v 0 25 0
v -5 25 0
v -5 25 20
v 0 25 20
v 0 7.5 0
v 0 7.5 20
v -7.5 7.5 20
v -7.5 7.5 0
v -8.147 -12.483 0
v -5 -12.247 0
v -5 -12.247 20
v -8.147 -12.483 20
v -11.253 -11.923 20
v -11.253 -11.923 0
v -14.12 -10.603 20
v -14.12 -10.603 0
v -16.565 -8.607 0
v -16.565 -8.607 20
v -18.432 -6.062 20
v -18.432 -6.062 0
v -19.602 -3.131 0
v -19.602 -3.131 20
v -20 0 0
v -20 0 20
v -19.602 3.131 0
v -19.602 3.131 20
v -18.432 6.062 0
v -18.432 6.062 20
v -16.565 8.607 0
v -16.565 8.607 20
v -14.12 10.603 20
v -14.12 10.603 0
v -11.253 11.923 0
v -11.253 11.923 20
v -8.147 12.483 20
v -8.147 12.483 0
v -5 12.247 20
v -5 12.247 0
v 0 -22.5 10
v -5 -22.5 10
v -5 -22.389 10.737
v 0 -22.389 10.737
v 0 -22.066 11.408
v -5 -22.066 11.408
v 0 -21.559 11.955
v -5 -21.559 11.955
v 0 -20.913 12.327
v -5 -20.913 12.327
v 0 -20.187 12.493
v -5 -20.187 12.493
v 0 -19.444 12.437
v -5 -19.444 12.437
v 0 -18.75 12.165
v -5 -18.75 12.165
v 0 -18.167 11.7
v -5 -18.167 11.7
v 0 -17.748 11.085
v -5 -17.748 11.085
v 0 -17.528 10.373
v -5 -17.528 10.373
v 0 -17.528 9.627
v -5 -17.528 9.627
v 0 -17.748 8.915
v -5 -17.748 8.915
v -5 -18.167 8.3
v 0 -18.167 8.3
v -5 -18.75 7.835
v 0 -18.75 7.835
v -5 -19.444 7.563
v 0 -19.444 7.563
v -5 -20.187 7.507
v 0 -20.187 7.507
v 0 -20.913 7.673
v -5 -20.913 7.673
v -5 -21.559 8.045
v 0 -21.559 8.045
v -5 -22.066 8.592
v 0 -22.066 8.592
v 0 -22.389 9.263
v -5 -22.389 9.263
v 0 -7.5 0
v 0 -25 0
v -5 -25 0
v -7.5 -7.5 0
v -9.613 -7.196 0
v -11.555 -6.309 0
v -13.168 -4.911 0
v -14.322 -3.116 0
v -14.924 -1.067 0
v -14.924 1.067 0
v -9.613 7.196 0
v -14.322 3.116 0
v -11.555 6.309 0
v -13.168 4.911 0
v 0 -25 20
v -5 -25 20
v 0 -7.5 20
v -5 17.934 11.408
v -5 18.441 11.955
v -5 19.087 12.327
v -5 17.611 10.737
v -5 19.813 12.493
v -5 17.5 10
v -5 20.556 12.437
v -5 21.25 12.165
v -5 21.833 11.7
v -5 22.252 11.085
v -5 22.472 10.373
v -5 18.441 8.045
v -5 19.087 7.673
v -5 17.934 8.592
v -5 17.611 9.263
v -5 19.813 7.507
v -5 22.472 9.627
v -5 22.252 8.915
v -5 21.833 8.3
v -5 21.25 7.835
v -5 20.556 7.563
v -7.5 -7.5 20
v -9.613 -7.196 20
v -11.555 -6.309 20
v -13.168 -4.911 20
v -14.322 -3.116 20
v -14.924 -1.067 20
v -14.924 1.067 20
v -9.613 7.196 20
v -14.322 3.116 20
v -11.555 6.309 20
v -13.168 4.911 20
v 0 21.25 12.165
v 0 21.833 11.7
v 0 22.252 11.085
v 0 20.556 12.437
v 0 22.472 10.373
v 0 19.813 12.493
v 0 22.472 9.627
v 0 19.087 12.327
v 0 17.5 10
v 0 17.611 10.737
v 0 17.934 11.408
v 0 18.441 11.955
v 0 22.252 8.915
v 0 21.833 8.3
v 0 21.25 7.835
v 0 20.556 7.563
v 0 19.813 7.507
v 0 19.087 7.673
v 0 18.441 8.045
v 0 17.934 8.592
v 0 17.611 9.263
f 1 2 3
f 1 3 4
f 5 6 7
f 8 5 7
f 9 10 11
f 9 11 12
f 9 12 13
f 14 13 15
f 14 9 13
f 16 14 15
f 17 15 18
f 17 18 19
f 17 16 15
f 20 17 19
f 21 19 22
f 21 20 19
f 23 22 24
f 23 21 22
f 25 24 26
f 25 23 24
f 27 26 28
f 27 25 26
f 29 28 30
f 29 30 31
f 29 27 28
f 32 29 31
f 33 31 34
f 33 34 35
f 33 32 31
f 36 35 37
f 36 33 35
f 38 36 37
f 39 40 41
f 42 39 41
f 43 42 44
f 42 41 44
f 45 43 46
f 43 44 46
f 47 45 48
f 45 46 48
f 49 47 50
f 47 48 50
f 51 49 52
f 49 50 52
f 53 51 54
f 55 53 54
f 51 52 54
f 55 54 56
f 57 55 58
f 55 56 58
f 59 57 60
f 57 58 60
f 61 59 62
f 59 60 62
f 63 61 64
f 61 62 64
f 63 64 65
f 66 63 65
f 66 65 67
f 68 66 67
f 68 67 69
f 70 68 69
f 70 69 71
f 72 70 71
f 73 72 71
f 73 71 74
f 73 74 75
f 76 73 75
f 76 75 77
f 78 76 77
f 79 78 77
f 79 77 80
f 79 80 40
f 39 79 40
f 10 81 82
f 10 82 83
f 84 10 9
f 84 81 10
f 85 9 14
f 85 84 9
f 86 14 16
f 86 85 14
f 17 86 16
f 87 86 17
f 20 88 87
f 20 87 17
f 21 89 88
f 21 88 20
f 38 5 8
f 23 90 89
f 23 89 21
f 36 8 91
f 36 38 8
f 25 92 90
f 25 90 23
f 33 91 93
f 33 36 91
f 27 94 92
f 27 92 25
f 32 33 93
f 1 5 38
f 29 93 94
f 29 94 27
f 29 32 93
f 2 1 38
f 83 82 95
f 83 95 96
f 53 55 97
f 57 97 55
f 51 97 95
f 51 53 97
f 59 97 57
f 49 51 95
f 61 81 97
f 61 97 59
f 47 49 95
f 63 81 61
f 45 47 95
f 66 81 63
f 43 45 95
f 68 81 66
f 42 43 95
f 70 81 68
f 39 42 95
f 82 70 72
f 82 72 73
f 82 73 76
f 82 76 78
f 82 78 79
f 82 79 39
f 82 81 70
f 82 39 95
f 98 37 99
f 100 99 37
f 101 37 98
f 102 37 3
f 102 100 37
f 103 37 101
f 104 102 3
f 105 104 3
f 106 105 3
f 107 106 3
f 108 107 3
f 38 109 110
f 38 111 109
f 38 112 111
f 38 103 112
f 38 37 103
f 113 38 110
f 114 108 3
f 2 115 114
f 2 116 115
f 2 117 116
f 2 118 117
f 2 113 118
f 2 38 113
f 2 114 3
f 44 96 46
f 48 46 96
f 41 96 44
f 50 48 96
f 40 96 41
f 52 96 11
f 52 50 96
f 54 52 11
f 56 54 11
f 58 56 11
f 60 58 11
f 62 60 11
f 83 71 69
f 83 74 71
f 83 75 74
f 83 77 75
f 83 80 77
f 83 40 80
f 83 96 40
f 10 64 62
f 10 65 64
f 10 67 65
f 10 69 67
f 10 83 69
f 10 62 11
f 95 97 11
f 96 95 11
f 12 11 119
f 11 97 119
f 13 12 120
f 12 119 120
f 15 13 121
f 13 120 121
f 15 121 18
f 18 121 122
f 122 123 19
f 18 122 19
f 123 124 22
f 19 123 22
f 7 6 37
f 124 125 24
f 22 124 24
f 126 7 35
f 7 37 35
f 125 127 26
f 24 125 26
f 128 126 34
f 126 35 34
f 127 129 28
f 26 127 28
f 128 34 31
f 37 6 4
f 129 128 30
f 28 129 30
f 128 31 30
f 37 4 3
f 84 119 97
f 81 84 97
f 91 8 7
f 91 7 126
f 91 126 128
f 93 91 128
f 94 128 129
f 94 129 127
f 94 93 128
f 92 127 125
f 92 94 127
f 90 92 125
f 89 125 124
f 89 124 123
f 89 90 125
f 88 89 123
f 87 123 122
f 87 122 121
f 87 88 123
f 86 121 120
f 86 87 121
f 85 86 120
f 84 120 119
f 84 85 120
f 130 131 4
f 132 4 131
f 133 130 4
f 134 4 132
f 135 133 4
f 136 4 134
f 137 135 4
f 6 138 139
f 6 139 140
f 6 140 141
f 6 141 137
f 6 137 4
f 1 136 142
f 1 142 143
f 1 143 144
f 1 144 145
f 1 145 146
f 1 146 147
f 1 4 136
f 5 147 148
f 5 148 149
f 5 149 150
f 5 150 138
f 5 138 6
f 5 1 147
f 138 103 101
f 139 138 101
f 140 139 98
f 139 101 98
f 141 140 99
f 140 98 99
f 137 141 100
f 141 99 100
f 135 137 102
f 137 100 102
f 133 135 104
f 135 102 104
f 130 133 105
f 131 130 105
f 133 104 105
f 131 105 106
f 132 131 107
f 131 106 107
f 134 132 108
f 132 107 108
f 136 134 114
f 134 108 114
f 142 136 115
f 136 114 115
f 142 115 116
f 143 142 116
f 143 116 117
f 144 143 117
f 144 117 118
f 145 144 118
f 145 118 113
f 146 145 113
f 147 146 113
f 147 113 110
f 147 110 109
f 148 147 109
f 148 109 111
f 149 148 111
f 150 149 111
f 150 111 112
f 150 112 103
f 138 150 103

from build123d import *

# Parameters (mm, degrees)
BOSS_EXTRUDE1_DEPTH = 20
SKETCH2_R           = 2.5
CUT_EXTRUDE1_DEPTH  = 15


with BuildPart() as part:
    # Sketch1 → Boss-Extrude1 (new body)
    with BuildSketch(Plane.XY):
        with BuildLine():
            Line((-5, 12.247448714), (-5, 25))
            Line((-5, 25), (0, 25))
            Line((0, 25), (0, 7.5))
            Line((0, 7.5), (-7.5, 7.5))
            ThreePointArc((-7.5, 7.5), (-15, 0), (-7.5, -7.5))
            Line((-7.5, -7.5), (0, -7.5))
            Line((0, -7.5), (0, -25))
            Line((0, -25), (-5, -25))
            Line((-5, -25), (-5, -12.247448714))
            ThreePointArc((-5, -12.247448714), (-20, 0), (-5, 12.247448714))
        make_face()
    extrude(amount=BOSS_EXTRUDE1_DEPTH)

    # Sketch2 → Cut-Extrude1 (cut)
    with BuildSketch(Plane.ZY.offset(5)):
        with Locations(Location((10, 20, 0), (0, 0, 270))):
            Circle(SKETCH2_R)
        with Locations(Location((10, -20, 0), (0, 0, 270))):
            Circle(SKETCH2_R)
    extrude(amount=-CUT_EXTRUDE1_DEPTH, mode=Mode.SUBTRACT)


solid = part.part
